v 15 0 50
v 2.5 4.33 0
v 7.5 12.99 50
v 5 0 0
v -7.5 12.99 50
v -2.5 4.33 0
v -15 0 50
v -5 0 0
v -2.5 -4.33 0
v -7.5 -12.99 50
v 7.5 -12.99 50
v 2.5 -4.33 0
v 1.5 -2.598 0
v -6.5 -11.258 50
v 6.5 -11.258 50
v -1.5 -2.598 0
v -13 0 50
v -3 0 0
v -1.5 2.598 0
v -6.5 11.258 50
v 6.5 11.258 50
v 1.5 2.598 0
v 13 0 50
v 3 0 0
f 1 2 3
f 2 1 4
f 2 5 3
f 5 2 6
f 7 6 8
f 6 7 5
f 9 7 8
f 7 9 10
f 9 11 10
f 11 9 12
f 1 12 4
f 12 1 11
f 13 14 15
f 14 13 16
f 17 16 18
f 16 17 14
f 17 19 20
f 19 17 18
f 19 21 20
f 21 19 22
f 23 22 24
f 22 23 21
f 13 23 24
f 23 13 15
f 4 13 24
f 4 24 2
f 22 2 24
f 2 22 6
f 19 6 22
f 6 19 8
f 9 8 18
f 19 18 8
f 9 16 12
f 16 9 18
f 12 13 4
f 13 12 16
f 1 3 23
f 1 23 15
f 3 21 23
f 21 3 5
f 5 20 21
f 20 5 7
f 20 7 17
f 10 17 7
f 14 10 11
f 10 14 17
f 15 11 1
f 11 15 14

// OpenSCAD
hohlzylinder(hoehe=50, untenr=5, obenr= 15,wd= 2,fn = 6, off=[[0,0], [0,0]]);


function kreisPkt(r, fn, n) = [r* cos(n*360/fn),r* sin(n*360/fn)];
function kreisListe(r, fn) = [for(n = [0:fn-1]) kreisPkt(r,fn,n)];
function ringListe(r, fn, wd) = [for(n = [0:fn]) kreisPkt(r,fn,n),for(n = [fn:-1:0]) kreisPkt(r-wd,fn,n)];



function kreisPkt3D(r, fn, n,z=0, xoff=0, yoff=0) = [r* cos(n*360/fn)+xoff,r* sin(n*360/fn)+yoff,z];
  
function ringListe3D(r, fn, wd,z, xoff=0, yoff=0) = [
  for(n = [0:fn-1]) kreisPkt3D(r,fn,n,z,xoff,yoff),
  for(n = [fn-1:-1:0]) let (thick = (is_list(wd)?(n < len(wd))?wd[n]:wd[len[wd]-1]:wd)) kreisPkt3D(r-thick,fn,n,z,xoff,yoff)];


function to2D(vals)=[
  for(p=vals) [p[0],p[1]]
];
module hohlzylinder(hoehe = 50, untenr = 20, obenr= -1,wd= 2, fn = 8, off=[[0,0], [0,0]])
{

  roben = (obenr >0)? obenr:untenr+wd;
  punkte = [
    each(ringListe3D(r=untenr, fn=fn, wd=wd, z=0, xoff=off[0][0], yoff=off[0][1])),
    each(ringListe3D(r=roben, fn=fn, wd=wd, z=hoehe, xoff=off[1][0], yoff=off[1][1]))
  ];
  flaechen = [

    for(n=[0:fn-1]) let(n1 = n+0+2*fn, n2= n+1+2*fn)[n,n1, (n2>= 3*fn)? n2-fn:n2,(n+1)%fn],//seiten
    for(n=[fn:2*fn-1]) let(n1 = (n+1>=2*fn)?n+1-fn: n+1, n2= 3*fn+n%fn+1, n3=n2-1)[(n3 <3*fn)?n3+fn-1:n3,(n2>= 4*fn)? n2-fn:n2,n1,n],//seiten
    for(n=[0:fn-1]) let(n2=2*fn-1-n, n3= n2+1, res= [n,(n+1)%fn,(n2>=2*fn)?n2-fn:n2,(n3>=2*fn)?n3-fn:n3])res,//stirnseiten
    for(n=[2*fn:3*fn-1]) let(n2=4*fn-1-n%fn, n3= n2+1, res= [(n3>=4*fn)?n3-fn:n3,n2,(n+1 >=3*fn)?n+1 -fn:n+1,n])res,//stirnseiten

    ];

  polyhedron(points=punkte, faces=flaechen);

}
